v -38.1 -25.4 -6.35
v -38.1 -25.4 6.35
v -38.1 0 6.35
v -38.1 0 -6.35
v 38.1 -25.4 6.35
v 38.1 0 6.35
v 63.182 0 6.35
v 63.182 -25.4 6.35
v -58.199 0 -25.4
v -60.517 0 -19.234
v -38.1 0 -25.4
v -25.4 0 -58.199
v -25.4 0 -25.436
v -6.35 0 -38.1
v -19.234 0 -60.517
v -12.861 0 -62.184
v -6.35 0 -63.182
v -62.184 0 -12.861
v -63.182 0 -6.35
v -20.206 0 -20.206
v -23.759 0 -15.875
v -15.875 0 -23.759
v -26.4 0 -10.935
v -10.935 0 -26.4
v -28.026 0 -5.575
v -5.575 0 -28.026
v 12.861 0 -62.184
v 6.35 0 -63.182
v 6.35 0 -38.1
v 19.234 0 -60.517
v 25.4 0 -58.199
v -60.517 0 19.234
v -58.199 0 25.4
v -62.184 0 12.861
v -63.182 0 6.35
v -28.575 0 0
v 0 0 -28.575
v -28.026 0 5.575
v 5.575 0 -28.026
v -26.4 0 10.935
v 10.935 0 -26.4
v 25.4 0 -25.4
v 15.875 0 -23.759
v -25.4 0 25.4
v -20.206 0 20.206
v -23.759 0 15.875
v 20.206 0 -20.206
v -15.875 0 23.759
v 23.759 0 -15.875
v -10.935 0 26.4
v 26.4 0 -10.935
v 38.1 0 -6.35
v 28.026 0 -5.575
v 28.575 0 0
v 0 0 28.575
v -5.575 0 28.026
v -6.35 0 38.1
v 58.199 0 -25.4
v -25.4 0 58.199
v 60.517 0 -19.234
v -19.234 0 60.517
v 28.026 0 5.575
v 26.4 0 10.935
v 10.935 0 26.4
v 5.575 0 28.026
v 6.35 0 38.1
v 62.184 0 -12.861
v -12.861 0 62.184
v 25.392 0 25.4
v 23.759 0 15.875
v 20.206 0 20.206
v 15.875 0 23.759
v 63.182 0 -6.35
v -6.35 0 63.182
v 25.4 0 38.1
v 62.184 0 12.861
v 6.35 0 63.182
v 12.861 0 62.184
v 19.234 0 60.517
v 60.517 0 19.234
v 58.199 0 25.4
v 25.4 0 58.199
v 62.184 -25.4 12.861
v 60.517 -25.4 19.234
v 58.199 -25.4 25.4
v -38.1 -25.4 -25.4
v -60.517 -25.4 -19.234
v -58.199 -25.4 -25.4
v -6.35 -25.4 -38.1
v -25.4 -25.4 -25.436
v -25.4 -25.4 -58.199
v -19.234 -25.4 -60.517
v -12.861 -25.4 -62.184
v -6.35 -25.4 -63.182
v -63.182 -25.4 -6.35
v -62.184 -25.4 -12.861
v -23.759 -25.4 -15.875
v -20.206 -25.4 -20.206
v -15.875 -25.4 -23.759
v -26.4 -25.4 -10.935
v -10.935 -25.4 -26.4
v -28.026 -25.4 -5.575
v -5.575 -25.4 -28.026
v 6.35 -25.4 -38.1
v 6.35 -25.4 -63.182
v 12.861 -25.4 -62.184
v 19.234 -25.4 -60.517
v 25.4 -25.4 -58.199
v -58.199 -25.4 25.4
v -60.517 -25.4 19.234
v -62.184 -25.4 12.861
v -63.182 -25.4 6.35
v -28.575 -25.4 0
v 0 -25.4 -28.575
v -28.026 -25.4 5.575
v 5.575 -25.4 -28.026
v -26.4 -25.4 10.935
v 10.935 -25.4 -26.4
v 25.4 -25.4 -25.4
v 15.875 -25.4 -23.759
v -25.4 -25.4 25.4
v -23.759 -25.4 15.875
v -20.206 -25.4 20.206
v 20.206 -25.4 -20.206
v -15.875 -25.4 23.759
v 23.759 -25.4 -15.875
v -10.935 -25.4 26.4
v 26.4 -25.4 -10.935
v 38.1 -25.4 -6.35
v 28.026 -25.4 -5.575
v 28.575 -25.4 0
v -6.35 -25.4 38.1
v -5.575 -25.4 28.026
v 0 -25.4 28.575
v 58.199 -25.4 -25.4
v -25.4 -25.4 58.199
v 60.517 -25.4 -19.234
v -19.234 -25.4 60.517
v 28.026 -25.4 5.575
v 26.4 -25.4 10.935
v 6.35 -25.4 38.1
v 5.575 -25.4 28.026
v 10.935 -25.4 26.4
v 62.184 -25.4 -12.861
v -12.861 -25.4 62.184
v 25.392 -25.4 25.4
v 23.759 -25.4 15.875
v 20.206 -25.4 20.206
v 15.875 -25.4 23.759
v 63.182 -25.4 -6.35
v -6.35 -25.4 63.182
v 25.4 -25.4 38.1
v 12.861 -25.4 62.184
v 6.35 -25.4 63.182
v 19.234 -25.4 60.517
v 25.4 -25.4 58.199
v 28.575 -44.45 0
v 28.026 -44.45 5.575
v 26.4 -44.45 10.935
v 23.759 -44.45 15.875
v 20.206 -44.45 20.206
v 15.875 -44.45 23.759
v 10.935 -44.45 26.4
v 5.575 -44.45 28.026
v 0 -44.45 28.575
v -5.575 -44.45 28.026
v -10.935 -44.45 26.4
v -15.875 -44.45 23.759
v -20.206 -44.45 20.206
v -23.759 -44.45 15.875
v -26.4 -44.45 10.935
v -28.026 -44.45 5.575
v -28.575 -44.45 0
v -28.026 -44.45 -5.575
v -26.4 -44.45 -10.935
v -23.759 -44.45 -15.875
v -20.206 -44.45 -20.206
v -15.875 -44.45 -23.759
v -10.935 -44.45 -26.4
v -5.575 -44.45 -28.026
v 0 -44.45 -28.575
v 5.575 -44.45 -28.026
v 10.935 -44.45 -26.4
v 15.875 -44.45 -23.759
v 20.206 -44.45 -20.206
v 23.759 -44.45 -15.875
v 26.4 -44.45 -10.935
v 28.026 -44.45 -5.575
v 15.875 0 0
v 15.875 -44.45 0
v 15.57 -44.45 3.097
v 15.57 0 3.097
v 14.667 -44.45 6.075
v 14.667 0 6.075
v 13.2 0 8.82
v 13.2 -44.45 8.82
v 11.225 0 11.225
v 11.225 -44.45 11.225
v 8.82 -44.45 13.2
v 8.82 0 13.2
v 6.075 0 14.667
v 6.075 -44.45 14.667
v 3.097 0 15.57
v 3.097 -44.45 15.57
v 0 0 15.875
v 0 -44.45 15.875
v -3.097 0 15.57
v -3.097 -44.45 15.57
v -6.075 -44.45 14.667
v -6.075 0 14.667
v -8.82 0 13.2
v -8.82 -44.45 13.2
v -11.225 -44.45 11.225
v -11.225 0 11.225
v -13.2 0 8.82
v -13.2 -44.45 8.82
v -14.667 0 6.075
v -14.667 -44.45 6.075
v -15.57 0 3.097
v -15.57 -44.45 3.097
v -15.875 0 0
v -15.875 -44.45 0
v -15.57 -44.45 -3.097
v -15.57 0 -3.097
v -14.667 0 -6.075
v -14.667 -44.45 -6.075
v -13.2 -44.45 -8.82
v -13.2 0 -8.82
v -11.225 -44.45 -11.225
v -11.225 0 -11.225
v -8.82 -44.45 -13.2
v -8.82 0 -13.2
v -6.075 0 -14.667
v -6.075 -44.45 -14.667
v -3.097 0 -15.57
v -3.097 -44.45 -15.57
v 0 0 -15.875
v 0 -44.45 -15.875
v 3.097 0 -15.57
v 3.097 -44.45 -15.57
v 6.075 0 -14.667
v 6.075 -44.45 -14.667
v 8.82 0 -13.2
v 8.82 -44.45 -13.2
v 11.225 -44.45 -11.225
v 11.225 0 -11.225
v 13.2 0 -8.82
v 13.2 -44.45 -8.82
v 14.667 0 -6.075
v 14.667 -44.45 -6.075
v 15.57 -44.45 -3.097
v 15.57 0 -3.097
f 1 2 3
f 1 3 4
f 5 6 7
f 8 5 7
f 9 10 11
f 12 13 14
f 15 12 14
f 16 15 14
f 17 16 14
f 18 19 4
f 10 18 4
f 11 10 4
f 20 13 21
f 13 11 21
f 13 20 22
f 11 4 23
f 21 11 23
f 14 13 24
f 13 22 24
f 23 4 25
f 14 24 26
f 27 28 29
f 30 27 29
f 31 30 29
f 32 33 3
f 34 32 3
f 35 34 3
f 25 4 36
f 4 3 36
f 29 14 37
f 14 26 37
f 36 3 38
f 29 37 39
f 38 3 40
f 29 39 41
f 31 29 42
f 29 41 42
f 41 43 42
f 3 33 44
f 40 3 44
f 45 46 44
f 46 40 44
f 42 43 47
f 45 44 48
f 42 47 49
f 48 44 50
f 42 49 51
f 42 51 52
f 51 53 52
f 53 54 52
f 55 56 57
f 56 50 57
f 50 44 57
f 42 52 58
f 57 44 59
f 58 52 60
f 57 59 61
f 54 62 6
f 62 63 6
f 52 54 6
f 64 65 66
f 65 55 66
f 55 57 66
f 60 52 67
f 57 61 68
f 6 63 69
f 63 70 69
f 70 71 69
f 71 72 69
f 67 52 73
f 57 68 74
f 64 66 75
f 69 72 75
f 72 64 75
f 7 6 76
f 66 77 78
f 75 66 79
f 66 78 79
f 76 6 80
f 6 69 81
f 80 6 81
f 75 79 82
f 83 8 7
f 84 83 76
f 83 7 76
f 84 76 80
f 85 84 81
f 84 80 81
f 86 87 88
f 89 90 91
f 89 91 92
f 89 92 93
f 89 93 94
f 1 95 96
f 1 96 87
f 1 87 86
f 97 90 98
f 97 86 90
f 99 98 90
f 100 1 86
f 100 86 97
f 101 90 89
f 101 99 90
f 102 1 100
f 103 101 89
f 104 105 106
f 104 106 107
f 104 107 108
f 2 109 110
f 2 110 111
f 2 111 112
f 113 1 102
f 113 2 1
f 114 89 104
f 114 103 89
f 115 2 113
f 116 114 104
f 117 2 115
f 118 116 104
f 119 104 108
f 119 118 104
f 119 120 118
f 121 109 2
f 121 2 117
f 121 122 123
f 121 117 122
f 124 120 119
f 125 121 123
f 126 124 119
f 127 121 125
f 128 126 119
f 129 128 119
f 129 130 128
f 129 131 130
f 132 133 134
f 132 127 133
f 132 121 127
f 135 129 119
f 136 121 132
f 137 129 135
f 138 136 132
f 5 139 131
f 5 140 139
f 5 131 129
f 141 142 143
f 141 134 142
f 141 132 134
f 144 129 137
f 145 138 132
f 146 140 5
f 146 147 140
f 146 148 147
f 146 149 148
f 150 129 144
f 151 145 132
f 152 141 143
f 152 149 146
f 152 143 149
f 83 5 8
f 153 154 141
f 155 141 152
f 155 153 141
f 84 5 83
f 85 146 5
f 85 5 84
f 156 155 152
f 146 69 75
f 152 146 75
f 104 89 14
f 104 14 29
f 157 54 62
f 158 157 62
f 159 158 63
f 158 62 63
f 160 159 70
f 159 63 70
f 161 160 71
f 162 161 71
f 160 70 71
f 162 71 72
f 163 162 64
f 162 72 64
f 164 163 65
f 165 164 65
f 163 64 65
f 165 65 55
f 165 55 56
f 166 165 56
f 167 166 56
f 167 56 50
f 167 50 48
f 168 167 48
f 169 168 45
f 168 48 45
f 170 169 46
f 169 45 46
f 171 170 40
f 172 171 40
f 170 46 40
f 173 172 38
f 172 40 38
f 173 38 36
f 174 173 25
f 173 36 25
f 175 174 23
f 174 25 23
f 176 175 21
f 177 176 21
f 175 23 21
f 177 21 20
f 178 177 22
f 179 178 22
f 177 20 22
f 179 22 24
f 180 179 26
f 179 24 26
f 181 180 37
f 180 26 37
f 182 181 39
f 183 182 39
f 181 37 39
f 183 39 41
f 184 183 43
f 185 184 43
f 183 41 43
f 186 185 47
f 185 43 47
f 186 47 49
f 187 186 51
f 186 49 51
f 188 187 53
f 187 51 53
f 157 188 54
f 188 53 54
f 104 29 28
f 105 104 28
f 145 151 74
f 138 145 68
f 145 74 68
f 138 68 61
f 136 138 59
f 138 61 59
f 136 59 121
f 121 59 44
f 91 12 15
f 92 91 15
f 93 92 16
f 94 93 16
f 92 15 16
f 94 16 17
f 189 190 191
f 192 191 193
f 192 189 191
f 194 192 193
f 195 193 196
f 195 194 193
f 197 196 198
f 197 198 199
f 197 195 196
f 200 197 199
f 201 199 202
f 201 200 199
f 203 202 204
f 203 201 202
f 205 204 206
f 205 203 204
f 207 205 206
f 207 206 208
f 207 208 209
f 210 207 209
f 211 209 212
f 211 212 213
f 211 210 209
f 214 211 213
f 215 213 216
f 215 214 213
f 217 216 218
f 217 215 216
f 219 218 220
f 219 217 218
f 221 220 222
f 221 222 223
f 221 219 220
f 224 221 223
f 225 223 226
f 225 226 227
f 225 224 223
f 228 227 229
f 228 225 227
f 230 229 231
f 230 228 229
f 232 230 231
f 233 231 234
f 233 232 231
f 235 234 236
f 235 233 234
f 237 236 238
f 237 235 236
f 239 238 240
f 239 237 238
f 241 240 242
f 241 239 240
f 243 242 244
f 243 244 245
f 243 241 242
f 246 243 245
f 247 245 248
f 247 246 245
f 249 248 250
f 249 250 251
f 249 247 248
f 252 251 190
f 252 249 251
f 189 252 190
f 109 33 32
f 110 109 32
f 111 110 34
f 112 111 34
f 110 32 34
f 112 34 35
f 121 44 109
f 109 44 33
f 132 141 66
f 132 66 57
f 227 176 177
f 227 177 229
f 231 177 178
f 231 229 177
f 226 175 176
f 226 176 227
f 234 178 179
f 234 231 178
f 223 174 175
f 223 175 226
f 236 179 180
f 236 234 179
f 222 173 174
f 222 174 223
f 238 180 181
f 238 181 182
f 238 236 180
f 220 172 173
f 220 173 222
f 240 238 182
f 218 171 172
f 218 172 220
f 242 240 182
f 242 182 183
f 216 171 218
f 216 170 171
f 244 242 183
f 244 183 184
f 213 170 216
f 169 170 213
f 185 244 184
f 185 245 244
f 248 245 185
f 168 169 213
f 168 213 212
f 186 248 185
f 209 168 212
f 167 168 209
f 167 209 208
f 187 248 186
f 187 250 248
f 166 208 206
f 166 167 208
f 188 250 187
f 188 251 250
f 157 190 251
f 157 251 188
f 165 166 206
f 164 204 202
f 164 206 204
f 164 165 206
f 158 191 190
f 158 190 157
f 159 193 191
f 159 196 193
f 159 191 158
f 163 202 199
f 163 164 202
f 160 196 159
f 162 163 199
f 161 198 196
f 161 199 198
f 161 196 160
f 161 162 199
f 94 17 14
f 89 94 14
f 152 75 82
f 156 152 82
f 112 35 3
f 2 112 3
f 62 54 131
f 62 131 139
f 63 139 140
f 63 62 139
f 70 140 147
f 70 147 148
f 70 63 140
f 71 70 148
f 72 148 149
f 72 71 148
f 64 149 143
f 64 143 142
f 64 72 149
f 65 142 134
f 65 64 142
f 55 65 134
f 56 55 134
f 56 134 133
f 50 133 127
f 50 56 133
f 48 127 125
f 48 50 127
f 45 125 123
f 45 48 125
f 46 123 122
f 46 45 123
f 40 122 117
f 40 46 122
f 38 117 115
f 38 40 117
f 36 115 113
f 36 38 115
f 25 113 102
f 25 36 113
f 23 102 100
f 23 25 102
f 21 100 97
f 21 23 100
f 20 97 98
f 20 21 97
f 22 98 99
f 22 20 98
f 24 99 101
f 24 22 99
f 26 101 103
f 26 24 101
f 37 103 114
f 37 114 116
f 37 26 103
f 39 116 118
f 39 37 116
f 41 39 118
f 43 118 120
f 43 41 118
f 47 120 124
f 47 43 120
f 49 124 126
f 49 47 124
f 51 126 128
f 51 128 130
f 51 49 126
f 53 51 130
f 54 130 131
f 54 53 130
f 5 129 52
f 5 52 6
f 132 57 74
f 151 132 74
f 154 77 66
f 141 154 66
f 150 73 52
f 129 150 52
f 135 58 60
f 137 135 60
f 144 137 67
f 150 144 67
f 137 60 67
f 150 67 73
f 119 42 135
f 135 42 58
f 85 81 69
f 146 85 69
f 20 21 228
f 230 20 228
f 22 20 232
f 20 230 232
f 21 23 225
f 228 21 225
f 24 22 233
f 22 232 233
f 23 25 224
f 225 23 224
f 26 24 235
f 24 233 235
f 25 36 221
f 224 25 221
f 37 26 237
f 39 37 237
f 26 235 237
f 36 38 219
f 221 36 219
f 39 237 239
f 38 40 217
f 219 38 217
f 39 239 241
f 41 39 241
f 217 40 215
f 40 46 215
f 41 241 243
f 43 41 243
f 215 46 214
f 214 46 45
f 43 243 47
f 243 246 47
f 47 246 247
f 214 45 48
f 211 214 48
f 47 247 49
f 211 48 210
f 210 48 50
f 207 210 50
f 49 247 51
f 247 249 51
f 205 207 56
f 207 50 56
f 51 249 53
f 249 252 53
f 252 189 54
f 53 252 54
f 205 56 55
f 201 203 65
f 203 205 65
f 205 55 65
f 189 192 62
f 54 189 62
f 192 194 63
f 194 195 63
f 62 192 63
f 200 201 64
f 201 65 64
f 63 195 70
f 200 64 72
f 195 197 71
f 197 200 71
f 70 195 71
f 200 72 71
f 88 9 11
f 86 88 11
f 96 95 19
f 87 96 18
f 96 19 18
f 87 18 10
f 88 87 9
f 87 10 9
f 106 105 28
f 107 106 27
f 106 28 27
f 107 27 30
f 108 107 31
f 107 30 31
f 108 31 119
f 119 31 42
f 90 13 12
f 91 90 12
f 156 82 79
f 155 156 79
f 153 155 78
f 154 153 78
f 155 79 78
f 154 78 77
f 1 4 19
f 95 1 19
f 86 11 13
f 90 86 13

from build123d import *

# Parameters (mm, degrees)
F0_R     = 28.575
F1_DEPTH = 25.4
F0_R_2   = 15.875
F2_DEPTH = 44.45


# Not quite as in the source:
# - a feature names something its author has since deleted; it is built from what else it names


with BuildPart() as f1:
    # F0 (on Front) → F1 (new body)
    with BuildSketch(Plane.XZ):
        with BuildLine():
            Line((58.1987113259, 25.4), (38.1, 25.4))
            Line((38.1, 25.4), (38.1, 6.35))
            Line((38.1, 6.35), (63.1817022563, 6.35))
            ThreePointArc((63.1817022563, 6.35), (61.4331085437, 16.069324026), (58.1987113259, 25.4))
        make_face()
        with BuildLine():
            Line((63.1817022563, -6.35), (38.1, -6.35))
            Line((38.1, -6.35), (38.1, -25.4))
            Line((38.1, -25.4), (58.1987113259, -25.4))
            ThreePointArc((58.1987113259, -25.4), (61.4331085437, -16.069324026), (63.1817022563, -6.35))
        make_face()
        with BuildLine():
            Line((25.4, -58.1987113259), (25.4, -38.1))
            Line((25.4, -38.1), (6.35, -38.1))
            Line((6.35, -38.1), (6.35, -63.1817022563))
            ThreePointArc((6.35, -63.1817022563), (16.069324026, -61.4331085437), (25.4, -58.1987113259))
        make_face()
        with BuildLine():
            Line((-6.35, -63.1817022563), (-6.35, -38.1))
            Line((-6.35, -38.1), (-25.4, -38.1))
            Line((-25.4, -38.1), (-25.4, -58.1987113259))
            ThreePointArc((-25.4, -58.1987113259), (-16.069324026, -61.4331085437), (-6.35, -63.1817022563))
        make_face()
        with BuildLine():
            Line((-38.1, -25.4), (-38.1, -6.35))
            Line((-38.1, -6.35), (-63.1817022563, -6.35))
            ThreePointArc((-63.1817022563, -6.35), (-61.4331085437, -16.069324026), (-58.1987113259, -25.4))
            Line((-58.1987113259, -25.4), (-38.1, -25.4))
        make_face()
        with BuildLine():
            Line((6.35, 38.1), (25.4, 38.1))
            Line((25.4, 38.1), (25.4, 58.1987113259))
            ThreePointArc((25.4, 58.1987113259), (16.069324026, 61.4331085437), (6.35, 63.1817022563))
            Line((6.35, 63.1817022563), (6.35, 38.1))
        make_face()
        with BuildLine():
            Line((-25.4, 38.1), (-6.35, 38.1))
            Line((-6.35, 38.1), (-6.35, 63.1817022563))
            ThreePointArc((-6.35, 63.1817022563), (-16.069324026, 61.4331085437), (-25.4, 58.1987113259))
            Line((-25.4, 58.1987113259), (-25.4, 38.1))
        make_face()
        Polygon((25.3924280405, 25.4), (25.4, 38.1), (6.35, 38.1), (-6.35, 38.1), (-25.4, 38.1), (-25.4, 25.4), (-38.1, 25.4), (-38.1, 13.6643098667), (-38.1, 6.35), (-38.1, -6.35), (-38.1, -25.4), (-25.4, -25.4357550293), (-25.4, -38.1), (-6.35, -38.1), (6.35, -38.1), (25.4, -38.1), (25.4, -25.4), (38.1, -25.4), (38.1, -6.35), (38.1, 6.35), (38.1, 25.4), align=None)
        Circle(F0_R, mode=Mode.SUBTRACT)
        with BuildLine():
            Line((-38.1, 13.6643098667), (-38.1, 25.4))
            Line((-38.1, 25.4), (-58.1987113259, 25.4))
            ThreePointArc((-58.1987113259, 25.4), (-61.4331085437, 16.069324026), (-63.1817022563, 6.35))
            Line((-63.1817022563, 6.35), (-38.1, 6.35))
            Line((-38.1, 6.35), (-38.1, 13.6643098667))
        make_face()
    extrude(amount=F1_DEPTH)


with BuildPart() as f2:
    # F0 (on Front) → F2 (new body)
    with BuildSketch(Plane.XZ):
        Circle(F0_R)
        Circle(F0_R_2, mode=Mode.SUBTRACT)
    extrude(amount=F2_DEPTH)


solid = Compound([f1.part, f2.part])
